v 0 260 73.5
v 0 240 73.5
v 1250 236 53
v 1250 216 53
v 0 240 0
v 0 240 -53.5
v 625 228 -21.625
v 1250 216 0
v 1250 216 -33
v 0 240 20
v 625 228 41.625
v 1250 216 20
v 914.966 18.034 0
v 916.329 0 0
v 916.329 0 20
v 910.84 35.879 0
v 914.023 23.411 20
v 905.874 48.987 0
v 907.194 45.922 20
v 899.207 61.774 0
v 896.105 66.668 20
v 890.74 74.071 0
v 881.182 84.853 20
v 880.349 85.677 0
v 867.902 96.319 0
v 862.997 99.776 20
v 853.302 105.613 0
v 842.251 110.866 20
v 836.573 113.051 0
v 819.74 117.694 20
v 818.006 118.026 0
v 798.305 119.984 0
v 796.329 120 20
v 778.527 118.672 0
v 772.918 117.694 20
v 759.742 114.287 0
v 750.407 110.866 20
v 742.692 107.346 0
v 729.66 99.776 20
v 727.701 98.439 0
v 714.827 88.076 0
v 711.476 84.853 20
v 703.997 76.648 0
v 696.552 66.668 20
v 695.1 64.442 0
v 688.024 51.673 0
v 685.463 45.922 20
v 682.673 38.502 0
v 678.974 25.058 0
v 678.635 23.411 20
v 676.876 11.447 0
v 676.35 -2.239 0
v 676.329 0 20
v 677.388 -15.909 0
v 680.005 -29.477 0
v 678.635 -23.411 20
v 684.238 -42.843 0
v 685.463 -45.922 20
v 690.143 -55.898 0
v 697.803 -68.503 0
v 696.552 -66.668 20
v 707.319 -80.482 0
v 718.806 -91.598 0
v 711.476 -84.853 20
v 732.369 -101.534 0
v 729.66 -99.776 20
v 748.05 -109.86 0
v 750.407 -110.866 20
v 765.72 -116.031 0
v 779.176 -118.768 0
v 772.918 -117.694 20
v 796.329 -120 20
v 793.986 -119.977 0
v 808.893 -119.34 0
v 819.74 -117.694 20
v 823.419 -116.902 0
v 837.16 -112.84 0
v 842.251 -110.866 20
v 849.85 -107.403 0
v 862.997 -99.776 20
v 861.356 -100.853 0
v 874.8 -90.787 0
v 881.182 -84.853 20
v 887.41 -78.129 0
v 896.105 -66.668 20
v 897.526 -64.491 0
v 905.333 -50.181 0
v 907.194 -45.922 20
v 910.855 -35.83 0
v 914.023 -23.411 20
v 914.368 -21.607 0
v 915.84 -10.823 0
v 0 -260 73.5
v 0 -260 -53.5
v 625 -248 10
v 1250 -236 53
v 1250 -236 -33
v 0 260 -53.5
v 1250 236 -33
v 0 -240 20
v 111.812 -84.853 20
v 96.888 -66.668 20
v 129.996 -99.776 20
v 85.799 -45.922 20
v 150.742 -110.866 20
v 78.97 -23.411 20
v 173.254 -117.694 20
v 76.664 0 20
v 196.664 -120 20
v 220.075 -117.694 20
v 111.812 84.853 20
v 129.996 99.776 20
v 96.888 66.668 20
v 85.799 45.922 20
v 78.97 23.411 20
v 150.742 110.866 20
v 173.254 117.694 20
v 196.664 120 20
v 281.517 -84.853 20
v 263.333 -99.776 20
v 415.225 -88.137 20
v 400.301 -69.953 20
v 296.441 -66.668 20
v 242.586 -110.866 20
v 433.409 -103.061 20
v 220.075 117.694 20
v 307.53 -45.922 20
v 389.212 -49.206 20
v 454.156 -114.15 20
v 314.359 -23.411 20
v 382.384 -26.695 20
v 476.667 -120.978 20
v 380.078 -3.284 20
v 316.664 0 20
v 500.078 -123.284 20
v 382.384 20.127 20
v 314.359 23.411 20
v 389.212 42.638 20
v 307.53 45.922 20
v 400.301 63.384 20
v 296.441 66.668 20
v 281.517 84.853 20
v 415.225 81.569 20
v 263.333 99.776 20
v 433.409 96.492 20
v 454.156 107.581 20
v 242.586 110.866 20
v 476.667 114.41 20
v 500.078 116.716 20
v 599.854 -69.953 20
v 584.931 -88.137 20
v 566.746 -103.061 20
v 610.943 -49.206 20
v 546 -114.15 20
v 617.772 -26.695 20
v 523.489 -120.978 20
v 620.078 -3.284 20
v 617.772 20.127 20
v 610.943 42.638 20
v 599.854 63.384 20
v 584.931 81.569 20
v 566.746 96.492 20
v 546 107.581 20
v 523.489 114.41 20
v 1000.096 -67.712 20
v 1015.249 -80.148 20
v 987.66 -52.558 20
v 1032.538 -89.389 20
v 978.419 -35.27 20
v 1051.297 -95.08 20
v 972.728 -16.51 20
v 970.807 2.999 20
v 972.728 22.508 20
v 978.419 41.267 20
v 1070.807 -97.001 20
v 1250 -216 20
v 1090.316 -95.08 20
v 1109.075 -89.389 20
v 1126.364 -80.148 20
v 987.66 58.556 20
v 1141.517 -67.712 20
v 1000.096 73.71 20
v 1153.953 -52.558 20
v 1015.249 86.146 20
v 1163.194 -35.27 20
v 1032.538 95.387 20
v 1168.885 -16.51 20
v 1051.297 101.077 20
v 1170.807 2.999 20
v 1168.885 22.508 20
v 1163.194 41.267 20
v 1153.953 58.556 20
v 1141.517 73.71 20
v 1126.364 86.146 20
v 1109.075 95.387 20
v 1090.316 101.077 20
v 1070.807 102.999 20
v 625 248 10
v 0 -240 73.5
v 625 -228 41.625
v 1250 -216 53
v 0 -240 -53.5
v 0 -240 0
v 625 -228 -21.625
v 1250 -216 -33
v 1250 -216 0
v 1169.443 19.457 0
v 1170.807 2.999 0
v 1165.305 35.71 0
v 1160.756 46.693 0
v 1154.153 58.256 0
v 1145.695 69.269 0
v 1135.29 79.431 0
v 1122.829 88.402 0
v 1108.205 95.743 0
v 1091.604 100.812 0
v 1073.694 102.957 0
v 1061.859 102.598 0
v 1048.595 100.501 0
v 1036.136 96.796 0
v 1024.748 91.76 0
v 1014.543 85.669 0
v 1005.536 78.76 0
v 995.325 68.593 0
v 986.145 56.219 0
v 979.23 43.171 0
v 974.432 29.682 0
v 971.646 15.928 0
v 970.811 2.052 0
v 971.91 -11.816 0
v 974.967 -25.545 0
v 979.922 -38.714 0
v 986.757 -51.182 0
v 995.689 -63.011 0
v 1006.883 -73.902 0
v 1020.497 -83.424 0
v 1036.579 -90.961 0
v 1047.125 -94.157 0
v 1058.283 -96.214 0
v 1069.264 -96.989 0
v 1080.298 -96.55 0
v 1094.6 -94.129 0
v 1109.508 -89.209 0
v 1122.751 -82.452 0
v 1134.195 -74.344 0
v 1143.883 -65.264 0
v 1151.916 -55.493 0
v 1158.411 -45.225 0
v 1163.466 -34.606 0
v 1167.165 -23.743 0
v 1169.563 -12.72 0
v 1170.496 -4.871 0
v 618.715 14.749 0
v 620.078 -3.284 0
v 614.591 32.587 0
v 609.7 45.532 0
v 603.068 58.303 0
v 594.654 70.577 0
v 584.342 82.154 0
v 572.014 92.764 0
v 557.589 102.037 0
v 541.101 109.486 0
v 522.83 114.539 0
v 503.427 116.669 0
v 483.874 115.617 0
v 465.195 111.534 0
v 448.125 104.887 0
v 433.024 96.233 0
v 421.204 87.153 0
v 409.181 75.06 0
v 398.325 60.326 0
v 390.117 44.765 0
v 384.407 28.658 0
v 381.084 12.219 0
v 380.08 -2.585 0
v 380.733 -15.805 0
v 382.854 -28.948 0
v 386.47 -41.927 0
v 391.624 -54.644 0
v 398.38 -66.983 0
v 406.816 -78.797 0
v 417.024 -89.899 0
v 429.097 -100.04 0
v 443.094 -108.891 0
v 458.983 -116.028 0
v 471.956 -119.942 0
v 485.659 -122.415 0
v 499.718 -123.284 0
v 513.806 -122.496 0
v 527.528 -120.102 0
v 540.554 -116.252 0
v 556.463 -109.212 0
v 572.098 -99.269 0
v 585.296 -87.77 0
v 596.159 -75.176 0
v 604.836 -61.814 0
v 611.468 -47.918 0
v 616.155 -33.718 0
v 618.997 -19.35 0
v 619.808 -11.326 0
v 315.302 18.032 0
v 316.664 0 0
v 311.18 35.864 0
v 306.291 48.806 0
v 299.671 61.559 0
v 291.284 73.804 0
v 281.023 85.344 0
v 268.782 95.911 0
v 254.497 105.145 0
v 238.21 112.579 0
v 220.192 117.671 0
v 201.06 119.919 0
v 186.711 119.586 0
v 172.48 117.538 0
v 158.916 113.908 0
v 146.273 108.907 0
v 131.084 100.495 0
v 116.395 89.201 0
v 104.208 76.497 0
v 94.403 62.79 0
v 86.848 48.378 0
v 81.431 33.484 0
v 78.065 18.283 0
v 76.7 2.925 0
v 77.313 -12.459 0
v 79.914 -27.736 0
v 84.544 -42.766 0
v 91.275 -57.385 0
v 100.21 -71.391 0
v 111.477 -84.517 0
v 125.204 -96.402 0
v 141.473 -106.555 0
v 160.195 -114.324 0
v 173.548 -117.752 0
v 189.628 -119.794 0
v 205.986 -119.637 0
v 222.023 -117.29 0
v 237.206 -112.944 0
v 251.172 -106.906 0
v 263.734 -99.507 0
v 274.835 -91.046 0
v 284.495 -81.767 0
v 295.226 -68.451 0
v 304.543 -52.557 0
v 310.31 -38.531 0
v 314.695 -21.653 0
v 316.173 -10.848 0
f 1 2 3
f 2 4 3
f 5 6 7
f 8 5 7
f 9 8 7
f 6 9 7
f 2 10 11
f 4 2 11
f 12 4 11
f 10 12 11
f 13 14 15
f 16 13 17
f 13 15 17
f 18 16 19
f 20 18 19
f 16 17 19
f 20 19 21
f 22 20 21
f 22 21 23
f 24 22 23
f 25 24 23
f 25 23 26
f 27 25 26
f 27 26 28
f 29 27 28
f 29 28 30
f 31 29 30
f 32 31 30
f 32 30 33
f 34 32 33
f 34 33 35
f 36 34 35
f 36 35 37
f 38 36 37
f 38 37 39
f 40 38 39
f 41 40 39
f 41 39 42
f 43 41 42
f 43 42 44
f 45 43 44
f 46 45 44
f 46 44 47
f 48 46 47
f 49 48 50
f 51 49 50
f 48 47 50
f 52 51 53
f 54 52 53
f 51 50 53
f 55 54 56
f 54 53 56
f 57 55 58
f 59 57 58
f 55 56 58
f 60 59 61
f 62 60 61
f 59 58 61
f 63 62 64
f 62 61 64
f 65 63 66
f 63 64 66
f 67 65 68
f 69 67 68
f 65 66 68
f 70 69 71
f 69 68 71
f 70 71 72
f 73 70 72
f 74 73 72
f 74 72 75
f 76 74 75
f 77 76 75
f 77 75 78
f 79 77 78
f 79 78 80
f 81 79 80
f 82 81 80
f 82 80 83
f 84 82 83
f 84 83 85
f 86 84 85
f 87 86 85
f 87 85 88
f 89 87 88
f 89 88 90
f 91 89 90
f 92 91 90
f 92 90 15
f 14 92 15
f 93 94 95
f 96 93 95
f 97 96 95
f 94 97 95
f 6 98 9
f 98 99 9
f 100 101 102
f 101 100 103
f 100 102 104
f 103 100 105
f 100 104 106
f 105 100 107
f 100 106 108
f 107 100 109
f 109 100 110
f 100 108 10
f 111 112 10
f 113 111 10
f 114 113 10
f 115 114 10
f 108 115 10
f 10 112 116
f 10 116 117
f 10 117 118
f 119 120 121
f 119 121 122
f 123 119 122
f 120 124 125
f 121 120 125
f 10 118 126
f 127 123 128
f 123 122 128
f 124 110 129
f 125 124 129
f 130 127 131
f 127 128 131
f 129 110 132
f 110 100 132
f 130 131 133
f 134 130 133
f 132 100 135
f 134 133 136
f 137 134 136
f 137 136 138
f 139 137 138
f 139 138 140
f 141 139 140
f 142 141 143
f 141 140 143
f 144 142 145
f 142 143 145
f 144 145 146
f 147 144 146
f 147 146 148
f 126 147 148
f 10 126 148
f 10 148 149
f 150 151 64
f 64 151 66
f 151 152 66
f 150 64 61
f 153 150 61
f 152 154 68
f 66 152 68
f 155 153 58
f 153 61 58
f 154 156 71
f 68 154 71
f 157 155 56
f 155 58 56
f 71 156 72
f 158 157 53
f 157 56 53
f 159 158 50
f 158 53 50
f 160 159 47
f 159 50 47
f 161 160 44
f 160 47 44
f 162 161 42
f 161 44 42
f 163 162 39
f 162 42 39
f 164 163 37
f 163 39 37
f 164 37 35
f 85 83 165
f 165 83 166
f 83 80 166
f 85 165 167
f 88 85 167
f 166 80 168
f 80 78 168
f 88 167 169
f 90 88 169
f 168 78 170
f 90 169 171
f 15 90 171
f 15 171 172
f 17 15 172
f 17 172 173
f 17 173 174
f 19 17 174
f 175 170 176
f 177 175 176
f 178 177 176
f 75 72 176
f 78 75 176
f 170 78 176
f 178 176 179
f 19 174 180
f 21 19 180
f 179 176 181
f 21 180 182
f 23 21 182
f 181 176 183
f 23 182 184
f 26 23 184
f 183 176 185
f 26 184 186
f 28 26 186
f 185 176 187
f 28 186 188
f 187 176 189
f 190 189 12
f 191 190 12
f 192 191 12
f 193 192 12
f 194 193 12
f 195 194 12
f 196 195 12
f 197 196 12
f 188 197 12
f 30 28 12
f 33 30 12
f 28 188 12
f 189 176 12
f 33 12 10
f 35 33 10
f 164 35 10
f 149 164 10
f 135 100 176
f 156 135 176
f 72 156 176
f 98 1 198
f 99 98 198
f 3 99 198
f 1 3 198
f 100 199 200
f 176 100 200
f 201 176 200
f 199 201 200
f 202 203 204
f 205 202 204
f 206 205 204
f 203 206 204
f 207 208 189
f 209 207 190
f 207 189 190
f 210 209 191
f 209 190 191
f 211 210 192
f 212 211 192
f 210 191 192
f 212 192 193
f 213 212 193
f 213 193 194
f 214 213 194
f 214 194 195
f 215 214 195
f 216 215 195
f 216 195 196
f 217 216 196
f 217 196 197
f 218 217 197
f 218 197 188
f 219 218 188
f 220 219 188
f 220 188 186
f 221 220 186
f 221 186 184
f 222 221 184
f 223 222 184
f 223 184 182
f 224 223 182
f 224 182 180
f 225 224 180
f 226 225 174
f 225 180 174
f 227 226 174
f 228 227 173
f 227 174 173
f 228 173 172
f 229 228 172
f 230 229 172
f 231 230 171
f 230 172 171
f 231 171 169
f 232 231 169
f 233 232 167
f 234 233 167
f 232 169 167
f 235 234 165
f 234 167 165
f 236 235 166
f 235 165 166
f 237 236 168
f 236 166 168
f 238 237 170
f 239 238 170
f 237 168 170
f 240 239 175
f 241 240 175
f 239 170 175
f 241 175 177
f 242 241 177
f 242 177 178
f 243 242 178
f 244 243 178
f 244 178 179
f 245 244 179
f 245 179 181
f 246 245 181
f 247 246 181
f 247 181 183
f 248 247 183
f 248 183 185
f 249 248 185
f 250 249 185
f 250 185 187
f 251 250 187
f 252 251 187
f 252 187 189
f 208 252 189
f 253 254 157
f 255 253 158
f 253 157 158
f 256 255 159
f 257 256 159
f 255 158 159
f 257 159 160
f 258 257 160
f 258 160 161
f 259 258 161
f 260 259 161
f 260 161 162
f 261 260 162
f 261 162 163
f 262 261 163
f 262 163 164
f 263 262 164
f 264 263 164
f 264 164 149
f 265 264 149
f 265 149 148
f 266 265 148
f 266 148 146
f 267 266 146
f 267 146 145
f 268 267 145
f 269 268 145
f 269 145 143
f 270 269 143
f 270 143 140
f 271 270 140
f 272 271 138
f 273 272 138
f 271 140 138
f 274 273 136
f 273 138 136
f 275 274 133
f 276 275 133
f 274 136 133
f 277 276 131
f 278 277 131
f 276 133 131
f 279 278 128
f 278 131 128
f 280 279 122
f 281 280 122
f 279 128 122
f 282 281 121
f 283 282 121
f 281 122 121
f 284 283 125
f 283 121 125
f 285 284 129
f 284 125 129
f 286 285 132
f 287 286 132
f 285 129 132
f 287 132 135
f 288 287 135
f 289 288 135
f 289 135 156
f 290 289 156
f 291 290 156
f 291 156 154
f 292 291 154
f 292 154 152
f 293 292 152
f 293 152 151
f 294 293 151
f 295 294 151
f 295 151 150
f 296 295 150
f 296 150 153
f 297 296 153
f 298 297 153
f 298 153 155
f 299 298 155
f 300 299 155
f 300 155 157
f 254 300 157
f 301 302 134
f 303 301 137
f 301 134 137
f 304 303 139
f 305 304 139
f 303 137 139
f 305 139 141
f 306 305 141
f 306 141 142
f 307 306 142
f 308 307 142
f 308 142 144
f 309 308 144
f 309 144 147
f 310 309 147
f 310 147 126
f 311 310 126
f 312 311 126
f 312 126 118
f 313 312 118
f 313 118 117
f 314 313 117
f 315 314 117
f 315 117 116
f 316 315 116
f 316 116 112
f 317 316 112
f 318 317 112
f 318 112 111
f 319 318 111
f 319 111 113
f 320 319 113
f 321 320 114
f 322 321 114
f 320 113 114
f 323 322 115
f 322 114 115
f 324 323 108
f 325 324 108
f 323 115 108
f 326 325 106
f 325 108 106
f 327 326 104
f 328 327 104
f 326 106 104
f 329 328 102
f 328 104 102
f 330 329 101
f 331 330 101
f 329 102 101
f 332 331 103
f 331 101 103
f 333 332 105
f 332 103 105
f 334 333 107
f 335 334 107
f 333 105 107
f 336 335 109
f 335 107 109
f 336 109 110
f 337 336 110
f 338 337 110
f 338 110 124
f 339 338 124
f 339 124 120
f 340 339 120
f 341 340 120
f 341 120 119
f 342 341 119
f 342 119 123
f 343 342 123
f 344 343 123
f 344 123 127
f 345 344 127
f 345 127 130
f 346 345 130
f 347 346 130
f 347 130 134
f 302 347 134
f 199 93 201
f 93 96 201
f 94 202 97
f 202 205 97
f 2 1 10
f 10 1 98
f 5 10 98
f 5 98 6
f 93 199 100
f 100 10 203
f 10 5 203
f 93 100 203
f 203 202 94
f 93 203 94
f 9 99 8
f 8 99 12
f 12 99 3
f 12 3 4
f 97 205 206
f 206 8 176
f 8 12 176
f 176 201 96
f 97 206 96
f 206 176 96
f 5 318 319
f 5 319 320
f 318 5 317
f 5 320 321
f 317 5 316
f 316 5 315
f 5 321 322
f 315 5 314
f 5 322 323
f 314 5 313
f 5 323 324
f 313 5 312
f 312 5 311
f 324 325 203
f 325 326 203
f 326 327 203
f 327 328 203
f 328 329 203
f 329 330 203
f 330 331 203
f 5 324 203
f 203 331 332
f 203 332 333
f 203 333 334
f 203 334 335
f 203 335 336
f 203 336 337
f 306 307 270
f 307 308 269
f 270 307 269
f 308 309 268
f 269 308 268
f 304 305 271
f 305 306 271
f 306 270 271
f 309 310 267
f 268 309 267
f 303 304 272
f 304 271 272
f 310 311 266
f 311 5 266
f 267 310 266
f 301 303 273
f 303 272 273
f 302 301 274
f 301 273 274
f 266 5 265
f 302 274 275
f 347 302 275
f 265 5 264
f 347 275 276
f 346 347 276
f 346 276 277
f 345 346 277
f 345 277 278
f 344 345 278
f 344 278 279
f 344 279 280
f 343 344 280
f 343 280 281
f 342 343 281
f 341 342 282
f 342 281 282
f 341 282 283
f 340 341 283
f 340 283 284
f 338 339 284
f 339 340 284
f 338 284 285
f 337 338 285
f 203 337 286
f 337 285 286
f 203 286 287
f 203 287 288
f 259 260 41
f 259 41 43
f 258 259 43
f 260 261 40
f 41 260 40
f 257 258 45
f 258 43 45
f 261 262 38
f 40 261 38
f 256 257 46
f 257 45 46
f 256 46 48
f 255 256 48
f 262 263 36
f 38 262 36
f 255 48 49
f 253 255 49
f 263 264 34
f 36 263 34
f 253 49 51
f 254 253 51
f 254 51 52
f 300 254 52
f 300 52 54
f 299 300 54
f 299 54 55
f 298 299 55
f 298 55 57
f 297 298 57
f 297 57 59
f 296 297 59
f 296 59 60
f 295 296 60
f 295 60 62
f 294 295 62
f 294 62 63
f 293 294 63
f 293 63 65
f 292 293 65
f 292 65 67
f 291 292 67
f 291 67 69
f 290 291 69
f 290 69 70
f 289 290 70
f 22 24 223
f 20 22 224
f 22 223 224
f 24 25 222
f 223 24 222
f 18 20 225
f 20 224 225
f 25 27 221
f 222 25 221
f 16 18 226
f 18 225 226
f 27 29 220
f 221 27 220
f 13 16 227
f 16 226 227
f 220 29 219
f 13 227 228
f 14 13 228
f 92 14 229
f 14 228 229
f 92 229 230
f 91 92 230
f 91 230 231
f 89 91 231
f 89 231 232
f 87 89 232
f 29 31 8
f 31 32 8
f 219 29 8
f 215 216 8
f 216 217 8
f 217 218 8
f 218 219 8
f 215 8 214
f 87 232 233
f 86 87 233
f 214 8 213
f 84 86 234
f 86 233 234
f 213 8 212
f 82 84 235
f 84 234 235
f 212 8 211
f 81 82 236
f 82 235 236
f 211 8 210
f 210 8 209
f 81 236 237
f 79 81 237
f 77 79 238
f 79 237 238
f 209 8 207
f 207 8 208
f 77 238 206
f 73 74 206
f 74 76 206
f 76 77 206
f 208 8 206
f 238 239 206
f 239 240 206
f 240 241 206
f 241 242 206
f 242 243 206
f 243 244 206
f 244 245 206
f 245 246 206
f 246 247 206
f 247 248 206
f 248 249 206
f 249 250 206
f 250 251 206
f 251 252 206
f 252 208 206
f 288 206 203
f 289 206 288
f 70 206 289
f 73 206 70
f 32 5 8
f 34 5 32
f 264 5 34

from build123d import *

# Parameters (mm, degrees)
SKETCH6_R          = 120
SKETCH6_R_2        = 100
CUT_EXTRUDE1_DEPTH = 74.5000001


with BuildPart() as part:
    # Sketch1 → Loft l3 section 0
    with BuildSketch(Plane(origin=(0, 0, 0), x_dir=(0, 0, -1), z_dir=(1, 0, 0))):
        Polygon((-73.5, 260), (53.5, 260), (53.5, 240), (0, 240), (0, -240), (53.5, -240), (53.5, -260), (-73.5, -260), (-73.5, -240), (-20, -240), (-20, 240), (-73.5, 240), align=None)
    # Sketch4 → Loft l3 section 1
    with BuildSketch(Plane(origin=(1250, 0, -1000), x_dir=(0, 0, 1), z_dir=(-1, 0, 0))):
        Polygon((967, 236), (1053, 236), (1053, 216), (1020, 216), (1020, -216), (1053, -216), (1053, -236), (967, -236), (967, -216), (1000, -216), (1000, 216), (967, 216), align=None)
    loft()

    # Sketch6 → Cut-Extrude1 (cut, through all)
    with BuildSketch(Plane.XY.offset(20)):
        with Locations((196.664397563, 0)):
            Circle(SKETCH6_R)
        with Locations((500.077852957, -3.284154434)):
            Circle(SKETCH6_R)
        with Locations((796.32876443, 0)):
            Circle(SKETCH6_R)
        with Locations((1070.806505034, 2.998831576)):
            Circle(SKETCH6_R_2)
    extrude(amount=-CUT_EXTRUDE1_DEPTH, mode=Mode.SUBTRACT)


solid = part.part
